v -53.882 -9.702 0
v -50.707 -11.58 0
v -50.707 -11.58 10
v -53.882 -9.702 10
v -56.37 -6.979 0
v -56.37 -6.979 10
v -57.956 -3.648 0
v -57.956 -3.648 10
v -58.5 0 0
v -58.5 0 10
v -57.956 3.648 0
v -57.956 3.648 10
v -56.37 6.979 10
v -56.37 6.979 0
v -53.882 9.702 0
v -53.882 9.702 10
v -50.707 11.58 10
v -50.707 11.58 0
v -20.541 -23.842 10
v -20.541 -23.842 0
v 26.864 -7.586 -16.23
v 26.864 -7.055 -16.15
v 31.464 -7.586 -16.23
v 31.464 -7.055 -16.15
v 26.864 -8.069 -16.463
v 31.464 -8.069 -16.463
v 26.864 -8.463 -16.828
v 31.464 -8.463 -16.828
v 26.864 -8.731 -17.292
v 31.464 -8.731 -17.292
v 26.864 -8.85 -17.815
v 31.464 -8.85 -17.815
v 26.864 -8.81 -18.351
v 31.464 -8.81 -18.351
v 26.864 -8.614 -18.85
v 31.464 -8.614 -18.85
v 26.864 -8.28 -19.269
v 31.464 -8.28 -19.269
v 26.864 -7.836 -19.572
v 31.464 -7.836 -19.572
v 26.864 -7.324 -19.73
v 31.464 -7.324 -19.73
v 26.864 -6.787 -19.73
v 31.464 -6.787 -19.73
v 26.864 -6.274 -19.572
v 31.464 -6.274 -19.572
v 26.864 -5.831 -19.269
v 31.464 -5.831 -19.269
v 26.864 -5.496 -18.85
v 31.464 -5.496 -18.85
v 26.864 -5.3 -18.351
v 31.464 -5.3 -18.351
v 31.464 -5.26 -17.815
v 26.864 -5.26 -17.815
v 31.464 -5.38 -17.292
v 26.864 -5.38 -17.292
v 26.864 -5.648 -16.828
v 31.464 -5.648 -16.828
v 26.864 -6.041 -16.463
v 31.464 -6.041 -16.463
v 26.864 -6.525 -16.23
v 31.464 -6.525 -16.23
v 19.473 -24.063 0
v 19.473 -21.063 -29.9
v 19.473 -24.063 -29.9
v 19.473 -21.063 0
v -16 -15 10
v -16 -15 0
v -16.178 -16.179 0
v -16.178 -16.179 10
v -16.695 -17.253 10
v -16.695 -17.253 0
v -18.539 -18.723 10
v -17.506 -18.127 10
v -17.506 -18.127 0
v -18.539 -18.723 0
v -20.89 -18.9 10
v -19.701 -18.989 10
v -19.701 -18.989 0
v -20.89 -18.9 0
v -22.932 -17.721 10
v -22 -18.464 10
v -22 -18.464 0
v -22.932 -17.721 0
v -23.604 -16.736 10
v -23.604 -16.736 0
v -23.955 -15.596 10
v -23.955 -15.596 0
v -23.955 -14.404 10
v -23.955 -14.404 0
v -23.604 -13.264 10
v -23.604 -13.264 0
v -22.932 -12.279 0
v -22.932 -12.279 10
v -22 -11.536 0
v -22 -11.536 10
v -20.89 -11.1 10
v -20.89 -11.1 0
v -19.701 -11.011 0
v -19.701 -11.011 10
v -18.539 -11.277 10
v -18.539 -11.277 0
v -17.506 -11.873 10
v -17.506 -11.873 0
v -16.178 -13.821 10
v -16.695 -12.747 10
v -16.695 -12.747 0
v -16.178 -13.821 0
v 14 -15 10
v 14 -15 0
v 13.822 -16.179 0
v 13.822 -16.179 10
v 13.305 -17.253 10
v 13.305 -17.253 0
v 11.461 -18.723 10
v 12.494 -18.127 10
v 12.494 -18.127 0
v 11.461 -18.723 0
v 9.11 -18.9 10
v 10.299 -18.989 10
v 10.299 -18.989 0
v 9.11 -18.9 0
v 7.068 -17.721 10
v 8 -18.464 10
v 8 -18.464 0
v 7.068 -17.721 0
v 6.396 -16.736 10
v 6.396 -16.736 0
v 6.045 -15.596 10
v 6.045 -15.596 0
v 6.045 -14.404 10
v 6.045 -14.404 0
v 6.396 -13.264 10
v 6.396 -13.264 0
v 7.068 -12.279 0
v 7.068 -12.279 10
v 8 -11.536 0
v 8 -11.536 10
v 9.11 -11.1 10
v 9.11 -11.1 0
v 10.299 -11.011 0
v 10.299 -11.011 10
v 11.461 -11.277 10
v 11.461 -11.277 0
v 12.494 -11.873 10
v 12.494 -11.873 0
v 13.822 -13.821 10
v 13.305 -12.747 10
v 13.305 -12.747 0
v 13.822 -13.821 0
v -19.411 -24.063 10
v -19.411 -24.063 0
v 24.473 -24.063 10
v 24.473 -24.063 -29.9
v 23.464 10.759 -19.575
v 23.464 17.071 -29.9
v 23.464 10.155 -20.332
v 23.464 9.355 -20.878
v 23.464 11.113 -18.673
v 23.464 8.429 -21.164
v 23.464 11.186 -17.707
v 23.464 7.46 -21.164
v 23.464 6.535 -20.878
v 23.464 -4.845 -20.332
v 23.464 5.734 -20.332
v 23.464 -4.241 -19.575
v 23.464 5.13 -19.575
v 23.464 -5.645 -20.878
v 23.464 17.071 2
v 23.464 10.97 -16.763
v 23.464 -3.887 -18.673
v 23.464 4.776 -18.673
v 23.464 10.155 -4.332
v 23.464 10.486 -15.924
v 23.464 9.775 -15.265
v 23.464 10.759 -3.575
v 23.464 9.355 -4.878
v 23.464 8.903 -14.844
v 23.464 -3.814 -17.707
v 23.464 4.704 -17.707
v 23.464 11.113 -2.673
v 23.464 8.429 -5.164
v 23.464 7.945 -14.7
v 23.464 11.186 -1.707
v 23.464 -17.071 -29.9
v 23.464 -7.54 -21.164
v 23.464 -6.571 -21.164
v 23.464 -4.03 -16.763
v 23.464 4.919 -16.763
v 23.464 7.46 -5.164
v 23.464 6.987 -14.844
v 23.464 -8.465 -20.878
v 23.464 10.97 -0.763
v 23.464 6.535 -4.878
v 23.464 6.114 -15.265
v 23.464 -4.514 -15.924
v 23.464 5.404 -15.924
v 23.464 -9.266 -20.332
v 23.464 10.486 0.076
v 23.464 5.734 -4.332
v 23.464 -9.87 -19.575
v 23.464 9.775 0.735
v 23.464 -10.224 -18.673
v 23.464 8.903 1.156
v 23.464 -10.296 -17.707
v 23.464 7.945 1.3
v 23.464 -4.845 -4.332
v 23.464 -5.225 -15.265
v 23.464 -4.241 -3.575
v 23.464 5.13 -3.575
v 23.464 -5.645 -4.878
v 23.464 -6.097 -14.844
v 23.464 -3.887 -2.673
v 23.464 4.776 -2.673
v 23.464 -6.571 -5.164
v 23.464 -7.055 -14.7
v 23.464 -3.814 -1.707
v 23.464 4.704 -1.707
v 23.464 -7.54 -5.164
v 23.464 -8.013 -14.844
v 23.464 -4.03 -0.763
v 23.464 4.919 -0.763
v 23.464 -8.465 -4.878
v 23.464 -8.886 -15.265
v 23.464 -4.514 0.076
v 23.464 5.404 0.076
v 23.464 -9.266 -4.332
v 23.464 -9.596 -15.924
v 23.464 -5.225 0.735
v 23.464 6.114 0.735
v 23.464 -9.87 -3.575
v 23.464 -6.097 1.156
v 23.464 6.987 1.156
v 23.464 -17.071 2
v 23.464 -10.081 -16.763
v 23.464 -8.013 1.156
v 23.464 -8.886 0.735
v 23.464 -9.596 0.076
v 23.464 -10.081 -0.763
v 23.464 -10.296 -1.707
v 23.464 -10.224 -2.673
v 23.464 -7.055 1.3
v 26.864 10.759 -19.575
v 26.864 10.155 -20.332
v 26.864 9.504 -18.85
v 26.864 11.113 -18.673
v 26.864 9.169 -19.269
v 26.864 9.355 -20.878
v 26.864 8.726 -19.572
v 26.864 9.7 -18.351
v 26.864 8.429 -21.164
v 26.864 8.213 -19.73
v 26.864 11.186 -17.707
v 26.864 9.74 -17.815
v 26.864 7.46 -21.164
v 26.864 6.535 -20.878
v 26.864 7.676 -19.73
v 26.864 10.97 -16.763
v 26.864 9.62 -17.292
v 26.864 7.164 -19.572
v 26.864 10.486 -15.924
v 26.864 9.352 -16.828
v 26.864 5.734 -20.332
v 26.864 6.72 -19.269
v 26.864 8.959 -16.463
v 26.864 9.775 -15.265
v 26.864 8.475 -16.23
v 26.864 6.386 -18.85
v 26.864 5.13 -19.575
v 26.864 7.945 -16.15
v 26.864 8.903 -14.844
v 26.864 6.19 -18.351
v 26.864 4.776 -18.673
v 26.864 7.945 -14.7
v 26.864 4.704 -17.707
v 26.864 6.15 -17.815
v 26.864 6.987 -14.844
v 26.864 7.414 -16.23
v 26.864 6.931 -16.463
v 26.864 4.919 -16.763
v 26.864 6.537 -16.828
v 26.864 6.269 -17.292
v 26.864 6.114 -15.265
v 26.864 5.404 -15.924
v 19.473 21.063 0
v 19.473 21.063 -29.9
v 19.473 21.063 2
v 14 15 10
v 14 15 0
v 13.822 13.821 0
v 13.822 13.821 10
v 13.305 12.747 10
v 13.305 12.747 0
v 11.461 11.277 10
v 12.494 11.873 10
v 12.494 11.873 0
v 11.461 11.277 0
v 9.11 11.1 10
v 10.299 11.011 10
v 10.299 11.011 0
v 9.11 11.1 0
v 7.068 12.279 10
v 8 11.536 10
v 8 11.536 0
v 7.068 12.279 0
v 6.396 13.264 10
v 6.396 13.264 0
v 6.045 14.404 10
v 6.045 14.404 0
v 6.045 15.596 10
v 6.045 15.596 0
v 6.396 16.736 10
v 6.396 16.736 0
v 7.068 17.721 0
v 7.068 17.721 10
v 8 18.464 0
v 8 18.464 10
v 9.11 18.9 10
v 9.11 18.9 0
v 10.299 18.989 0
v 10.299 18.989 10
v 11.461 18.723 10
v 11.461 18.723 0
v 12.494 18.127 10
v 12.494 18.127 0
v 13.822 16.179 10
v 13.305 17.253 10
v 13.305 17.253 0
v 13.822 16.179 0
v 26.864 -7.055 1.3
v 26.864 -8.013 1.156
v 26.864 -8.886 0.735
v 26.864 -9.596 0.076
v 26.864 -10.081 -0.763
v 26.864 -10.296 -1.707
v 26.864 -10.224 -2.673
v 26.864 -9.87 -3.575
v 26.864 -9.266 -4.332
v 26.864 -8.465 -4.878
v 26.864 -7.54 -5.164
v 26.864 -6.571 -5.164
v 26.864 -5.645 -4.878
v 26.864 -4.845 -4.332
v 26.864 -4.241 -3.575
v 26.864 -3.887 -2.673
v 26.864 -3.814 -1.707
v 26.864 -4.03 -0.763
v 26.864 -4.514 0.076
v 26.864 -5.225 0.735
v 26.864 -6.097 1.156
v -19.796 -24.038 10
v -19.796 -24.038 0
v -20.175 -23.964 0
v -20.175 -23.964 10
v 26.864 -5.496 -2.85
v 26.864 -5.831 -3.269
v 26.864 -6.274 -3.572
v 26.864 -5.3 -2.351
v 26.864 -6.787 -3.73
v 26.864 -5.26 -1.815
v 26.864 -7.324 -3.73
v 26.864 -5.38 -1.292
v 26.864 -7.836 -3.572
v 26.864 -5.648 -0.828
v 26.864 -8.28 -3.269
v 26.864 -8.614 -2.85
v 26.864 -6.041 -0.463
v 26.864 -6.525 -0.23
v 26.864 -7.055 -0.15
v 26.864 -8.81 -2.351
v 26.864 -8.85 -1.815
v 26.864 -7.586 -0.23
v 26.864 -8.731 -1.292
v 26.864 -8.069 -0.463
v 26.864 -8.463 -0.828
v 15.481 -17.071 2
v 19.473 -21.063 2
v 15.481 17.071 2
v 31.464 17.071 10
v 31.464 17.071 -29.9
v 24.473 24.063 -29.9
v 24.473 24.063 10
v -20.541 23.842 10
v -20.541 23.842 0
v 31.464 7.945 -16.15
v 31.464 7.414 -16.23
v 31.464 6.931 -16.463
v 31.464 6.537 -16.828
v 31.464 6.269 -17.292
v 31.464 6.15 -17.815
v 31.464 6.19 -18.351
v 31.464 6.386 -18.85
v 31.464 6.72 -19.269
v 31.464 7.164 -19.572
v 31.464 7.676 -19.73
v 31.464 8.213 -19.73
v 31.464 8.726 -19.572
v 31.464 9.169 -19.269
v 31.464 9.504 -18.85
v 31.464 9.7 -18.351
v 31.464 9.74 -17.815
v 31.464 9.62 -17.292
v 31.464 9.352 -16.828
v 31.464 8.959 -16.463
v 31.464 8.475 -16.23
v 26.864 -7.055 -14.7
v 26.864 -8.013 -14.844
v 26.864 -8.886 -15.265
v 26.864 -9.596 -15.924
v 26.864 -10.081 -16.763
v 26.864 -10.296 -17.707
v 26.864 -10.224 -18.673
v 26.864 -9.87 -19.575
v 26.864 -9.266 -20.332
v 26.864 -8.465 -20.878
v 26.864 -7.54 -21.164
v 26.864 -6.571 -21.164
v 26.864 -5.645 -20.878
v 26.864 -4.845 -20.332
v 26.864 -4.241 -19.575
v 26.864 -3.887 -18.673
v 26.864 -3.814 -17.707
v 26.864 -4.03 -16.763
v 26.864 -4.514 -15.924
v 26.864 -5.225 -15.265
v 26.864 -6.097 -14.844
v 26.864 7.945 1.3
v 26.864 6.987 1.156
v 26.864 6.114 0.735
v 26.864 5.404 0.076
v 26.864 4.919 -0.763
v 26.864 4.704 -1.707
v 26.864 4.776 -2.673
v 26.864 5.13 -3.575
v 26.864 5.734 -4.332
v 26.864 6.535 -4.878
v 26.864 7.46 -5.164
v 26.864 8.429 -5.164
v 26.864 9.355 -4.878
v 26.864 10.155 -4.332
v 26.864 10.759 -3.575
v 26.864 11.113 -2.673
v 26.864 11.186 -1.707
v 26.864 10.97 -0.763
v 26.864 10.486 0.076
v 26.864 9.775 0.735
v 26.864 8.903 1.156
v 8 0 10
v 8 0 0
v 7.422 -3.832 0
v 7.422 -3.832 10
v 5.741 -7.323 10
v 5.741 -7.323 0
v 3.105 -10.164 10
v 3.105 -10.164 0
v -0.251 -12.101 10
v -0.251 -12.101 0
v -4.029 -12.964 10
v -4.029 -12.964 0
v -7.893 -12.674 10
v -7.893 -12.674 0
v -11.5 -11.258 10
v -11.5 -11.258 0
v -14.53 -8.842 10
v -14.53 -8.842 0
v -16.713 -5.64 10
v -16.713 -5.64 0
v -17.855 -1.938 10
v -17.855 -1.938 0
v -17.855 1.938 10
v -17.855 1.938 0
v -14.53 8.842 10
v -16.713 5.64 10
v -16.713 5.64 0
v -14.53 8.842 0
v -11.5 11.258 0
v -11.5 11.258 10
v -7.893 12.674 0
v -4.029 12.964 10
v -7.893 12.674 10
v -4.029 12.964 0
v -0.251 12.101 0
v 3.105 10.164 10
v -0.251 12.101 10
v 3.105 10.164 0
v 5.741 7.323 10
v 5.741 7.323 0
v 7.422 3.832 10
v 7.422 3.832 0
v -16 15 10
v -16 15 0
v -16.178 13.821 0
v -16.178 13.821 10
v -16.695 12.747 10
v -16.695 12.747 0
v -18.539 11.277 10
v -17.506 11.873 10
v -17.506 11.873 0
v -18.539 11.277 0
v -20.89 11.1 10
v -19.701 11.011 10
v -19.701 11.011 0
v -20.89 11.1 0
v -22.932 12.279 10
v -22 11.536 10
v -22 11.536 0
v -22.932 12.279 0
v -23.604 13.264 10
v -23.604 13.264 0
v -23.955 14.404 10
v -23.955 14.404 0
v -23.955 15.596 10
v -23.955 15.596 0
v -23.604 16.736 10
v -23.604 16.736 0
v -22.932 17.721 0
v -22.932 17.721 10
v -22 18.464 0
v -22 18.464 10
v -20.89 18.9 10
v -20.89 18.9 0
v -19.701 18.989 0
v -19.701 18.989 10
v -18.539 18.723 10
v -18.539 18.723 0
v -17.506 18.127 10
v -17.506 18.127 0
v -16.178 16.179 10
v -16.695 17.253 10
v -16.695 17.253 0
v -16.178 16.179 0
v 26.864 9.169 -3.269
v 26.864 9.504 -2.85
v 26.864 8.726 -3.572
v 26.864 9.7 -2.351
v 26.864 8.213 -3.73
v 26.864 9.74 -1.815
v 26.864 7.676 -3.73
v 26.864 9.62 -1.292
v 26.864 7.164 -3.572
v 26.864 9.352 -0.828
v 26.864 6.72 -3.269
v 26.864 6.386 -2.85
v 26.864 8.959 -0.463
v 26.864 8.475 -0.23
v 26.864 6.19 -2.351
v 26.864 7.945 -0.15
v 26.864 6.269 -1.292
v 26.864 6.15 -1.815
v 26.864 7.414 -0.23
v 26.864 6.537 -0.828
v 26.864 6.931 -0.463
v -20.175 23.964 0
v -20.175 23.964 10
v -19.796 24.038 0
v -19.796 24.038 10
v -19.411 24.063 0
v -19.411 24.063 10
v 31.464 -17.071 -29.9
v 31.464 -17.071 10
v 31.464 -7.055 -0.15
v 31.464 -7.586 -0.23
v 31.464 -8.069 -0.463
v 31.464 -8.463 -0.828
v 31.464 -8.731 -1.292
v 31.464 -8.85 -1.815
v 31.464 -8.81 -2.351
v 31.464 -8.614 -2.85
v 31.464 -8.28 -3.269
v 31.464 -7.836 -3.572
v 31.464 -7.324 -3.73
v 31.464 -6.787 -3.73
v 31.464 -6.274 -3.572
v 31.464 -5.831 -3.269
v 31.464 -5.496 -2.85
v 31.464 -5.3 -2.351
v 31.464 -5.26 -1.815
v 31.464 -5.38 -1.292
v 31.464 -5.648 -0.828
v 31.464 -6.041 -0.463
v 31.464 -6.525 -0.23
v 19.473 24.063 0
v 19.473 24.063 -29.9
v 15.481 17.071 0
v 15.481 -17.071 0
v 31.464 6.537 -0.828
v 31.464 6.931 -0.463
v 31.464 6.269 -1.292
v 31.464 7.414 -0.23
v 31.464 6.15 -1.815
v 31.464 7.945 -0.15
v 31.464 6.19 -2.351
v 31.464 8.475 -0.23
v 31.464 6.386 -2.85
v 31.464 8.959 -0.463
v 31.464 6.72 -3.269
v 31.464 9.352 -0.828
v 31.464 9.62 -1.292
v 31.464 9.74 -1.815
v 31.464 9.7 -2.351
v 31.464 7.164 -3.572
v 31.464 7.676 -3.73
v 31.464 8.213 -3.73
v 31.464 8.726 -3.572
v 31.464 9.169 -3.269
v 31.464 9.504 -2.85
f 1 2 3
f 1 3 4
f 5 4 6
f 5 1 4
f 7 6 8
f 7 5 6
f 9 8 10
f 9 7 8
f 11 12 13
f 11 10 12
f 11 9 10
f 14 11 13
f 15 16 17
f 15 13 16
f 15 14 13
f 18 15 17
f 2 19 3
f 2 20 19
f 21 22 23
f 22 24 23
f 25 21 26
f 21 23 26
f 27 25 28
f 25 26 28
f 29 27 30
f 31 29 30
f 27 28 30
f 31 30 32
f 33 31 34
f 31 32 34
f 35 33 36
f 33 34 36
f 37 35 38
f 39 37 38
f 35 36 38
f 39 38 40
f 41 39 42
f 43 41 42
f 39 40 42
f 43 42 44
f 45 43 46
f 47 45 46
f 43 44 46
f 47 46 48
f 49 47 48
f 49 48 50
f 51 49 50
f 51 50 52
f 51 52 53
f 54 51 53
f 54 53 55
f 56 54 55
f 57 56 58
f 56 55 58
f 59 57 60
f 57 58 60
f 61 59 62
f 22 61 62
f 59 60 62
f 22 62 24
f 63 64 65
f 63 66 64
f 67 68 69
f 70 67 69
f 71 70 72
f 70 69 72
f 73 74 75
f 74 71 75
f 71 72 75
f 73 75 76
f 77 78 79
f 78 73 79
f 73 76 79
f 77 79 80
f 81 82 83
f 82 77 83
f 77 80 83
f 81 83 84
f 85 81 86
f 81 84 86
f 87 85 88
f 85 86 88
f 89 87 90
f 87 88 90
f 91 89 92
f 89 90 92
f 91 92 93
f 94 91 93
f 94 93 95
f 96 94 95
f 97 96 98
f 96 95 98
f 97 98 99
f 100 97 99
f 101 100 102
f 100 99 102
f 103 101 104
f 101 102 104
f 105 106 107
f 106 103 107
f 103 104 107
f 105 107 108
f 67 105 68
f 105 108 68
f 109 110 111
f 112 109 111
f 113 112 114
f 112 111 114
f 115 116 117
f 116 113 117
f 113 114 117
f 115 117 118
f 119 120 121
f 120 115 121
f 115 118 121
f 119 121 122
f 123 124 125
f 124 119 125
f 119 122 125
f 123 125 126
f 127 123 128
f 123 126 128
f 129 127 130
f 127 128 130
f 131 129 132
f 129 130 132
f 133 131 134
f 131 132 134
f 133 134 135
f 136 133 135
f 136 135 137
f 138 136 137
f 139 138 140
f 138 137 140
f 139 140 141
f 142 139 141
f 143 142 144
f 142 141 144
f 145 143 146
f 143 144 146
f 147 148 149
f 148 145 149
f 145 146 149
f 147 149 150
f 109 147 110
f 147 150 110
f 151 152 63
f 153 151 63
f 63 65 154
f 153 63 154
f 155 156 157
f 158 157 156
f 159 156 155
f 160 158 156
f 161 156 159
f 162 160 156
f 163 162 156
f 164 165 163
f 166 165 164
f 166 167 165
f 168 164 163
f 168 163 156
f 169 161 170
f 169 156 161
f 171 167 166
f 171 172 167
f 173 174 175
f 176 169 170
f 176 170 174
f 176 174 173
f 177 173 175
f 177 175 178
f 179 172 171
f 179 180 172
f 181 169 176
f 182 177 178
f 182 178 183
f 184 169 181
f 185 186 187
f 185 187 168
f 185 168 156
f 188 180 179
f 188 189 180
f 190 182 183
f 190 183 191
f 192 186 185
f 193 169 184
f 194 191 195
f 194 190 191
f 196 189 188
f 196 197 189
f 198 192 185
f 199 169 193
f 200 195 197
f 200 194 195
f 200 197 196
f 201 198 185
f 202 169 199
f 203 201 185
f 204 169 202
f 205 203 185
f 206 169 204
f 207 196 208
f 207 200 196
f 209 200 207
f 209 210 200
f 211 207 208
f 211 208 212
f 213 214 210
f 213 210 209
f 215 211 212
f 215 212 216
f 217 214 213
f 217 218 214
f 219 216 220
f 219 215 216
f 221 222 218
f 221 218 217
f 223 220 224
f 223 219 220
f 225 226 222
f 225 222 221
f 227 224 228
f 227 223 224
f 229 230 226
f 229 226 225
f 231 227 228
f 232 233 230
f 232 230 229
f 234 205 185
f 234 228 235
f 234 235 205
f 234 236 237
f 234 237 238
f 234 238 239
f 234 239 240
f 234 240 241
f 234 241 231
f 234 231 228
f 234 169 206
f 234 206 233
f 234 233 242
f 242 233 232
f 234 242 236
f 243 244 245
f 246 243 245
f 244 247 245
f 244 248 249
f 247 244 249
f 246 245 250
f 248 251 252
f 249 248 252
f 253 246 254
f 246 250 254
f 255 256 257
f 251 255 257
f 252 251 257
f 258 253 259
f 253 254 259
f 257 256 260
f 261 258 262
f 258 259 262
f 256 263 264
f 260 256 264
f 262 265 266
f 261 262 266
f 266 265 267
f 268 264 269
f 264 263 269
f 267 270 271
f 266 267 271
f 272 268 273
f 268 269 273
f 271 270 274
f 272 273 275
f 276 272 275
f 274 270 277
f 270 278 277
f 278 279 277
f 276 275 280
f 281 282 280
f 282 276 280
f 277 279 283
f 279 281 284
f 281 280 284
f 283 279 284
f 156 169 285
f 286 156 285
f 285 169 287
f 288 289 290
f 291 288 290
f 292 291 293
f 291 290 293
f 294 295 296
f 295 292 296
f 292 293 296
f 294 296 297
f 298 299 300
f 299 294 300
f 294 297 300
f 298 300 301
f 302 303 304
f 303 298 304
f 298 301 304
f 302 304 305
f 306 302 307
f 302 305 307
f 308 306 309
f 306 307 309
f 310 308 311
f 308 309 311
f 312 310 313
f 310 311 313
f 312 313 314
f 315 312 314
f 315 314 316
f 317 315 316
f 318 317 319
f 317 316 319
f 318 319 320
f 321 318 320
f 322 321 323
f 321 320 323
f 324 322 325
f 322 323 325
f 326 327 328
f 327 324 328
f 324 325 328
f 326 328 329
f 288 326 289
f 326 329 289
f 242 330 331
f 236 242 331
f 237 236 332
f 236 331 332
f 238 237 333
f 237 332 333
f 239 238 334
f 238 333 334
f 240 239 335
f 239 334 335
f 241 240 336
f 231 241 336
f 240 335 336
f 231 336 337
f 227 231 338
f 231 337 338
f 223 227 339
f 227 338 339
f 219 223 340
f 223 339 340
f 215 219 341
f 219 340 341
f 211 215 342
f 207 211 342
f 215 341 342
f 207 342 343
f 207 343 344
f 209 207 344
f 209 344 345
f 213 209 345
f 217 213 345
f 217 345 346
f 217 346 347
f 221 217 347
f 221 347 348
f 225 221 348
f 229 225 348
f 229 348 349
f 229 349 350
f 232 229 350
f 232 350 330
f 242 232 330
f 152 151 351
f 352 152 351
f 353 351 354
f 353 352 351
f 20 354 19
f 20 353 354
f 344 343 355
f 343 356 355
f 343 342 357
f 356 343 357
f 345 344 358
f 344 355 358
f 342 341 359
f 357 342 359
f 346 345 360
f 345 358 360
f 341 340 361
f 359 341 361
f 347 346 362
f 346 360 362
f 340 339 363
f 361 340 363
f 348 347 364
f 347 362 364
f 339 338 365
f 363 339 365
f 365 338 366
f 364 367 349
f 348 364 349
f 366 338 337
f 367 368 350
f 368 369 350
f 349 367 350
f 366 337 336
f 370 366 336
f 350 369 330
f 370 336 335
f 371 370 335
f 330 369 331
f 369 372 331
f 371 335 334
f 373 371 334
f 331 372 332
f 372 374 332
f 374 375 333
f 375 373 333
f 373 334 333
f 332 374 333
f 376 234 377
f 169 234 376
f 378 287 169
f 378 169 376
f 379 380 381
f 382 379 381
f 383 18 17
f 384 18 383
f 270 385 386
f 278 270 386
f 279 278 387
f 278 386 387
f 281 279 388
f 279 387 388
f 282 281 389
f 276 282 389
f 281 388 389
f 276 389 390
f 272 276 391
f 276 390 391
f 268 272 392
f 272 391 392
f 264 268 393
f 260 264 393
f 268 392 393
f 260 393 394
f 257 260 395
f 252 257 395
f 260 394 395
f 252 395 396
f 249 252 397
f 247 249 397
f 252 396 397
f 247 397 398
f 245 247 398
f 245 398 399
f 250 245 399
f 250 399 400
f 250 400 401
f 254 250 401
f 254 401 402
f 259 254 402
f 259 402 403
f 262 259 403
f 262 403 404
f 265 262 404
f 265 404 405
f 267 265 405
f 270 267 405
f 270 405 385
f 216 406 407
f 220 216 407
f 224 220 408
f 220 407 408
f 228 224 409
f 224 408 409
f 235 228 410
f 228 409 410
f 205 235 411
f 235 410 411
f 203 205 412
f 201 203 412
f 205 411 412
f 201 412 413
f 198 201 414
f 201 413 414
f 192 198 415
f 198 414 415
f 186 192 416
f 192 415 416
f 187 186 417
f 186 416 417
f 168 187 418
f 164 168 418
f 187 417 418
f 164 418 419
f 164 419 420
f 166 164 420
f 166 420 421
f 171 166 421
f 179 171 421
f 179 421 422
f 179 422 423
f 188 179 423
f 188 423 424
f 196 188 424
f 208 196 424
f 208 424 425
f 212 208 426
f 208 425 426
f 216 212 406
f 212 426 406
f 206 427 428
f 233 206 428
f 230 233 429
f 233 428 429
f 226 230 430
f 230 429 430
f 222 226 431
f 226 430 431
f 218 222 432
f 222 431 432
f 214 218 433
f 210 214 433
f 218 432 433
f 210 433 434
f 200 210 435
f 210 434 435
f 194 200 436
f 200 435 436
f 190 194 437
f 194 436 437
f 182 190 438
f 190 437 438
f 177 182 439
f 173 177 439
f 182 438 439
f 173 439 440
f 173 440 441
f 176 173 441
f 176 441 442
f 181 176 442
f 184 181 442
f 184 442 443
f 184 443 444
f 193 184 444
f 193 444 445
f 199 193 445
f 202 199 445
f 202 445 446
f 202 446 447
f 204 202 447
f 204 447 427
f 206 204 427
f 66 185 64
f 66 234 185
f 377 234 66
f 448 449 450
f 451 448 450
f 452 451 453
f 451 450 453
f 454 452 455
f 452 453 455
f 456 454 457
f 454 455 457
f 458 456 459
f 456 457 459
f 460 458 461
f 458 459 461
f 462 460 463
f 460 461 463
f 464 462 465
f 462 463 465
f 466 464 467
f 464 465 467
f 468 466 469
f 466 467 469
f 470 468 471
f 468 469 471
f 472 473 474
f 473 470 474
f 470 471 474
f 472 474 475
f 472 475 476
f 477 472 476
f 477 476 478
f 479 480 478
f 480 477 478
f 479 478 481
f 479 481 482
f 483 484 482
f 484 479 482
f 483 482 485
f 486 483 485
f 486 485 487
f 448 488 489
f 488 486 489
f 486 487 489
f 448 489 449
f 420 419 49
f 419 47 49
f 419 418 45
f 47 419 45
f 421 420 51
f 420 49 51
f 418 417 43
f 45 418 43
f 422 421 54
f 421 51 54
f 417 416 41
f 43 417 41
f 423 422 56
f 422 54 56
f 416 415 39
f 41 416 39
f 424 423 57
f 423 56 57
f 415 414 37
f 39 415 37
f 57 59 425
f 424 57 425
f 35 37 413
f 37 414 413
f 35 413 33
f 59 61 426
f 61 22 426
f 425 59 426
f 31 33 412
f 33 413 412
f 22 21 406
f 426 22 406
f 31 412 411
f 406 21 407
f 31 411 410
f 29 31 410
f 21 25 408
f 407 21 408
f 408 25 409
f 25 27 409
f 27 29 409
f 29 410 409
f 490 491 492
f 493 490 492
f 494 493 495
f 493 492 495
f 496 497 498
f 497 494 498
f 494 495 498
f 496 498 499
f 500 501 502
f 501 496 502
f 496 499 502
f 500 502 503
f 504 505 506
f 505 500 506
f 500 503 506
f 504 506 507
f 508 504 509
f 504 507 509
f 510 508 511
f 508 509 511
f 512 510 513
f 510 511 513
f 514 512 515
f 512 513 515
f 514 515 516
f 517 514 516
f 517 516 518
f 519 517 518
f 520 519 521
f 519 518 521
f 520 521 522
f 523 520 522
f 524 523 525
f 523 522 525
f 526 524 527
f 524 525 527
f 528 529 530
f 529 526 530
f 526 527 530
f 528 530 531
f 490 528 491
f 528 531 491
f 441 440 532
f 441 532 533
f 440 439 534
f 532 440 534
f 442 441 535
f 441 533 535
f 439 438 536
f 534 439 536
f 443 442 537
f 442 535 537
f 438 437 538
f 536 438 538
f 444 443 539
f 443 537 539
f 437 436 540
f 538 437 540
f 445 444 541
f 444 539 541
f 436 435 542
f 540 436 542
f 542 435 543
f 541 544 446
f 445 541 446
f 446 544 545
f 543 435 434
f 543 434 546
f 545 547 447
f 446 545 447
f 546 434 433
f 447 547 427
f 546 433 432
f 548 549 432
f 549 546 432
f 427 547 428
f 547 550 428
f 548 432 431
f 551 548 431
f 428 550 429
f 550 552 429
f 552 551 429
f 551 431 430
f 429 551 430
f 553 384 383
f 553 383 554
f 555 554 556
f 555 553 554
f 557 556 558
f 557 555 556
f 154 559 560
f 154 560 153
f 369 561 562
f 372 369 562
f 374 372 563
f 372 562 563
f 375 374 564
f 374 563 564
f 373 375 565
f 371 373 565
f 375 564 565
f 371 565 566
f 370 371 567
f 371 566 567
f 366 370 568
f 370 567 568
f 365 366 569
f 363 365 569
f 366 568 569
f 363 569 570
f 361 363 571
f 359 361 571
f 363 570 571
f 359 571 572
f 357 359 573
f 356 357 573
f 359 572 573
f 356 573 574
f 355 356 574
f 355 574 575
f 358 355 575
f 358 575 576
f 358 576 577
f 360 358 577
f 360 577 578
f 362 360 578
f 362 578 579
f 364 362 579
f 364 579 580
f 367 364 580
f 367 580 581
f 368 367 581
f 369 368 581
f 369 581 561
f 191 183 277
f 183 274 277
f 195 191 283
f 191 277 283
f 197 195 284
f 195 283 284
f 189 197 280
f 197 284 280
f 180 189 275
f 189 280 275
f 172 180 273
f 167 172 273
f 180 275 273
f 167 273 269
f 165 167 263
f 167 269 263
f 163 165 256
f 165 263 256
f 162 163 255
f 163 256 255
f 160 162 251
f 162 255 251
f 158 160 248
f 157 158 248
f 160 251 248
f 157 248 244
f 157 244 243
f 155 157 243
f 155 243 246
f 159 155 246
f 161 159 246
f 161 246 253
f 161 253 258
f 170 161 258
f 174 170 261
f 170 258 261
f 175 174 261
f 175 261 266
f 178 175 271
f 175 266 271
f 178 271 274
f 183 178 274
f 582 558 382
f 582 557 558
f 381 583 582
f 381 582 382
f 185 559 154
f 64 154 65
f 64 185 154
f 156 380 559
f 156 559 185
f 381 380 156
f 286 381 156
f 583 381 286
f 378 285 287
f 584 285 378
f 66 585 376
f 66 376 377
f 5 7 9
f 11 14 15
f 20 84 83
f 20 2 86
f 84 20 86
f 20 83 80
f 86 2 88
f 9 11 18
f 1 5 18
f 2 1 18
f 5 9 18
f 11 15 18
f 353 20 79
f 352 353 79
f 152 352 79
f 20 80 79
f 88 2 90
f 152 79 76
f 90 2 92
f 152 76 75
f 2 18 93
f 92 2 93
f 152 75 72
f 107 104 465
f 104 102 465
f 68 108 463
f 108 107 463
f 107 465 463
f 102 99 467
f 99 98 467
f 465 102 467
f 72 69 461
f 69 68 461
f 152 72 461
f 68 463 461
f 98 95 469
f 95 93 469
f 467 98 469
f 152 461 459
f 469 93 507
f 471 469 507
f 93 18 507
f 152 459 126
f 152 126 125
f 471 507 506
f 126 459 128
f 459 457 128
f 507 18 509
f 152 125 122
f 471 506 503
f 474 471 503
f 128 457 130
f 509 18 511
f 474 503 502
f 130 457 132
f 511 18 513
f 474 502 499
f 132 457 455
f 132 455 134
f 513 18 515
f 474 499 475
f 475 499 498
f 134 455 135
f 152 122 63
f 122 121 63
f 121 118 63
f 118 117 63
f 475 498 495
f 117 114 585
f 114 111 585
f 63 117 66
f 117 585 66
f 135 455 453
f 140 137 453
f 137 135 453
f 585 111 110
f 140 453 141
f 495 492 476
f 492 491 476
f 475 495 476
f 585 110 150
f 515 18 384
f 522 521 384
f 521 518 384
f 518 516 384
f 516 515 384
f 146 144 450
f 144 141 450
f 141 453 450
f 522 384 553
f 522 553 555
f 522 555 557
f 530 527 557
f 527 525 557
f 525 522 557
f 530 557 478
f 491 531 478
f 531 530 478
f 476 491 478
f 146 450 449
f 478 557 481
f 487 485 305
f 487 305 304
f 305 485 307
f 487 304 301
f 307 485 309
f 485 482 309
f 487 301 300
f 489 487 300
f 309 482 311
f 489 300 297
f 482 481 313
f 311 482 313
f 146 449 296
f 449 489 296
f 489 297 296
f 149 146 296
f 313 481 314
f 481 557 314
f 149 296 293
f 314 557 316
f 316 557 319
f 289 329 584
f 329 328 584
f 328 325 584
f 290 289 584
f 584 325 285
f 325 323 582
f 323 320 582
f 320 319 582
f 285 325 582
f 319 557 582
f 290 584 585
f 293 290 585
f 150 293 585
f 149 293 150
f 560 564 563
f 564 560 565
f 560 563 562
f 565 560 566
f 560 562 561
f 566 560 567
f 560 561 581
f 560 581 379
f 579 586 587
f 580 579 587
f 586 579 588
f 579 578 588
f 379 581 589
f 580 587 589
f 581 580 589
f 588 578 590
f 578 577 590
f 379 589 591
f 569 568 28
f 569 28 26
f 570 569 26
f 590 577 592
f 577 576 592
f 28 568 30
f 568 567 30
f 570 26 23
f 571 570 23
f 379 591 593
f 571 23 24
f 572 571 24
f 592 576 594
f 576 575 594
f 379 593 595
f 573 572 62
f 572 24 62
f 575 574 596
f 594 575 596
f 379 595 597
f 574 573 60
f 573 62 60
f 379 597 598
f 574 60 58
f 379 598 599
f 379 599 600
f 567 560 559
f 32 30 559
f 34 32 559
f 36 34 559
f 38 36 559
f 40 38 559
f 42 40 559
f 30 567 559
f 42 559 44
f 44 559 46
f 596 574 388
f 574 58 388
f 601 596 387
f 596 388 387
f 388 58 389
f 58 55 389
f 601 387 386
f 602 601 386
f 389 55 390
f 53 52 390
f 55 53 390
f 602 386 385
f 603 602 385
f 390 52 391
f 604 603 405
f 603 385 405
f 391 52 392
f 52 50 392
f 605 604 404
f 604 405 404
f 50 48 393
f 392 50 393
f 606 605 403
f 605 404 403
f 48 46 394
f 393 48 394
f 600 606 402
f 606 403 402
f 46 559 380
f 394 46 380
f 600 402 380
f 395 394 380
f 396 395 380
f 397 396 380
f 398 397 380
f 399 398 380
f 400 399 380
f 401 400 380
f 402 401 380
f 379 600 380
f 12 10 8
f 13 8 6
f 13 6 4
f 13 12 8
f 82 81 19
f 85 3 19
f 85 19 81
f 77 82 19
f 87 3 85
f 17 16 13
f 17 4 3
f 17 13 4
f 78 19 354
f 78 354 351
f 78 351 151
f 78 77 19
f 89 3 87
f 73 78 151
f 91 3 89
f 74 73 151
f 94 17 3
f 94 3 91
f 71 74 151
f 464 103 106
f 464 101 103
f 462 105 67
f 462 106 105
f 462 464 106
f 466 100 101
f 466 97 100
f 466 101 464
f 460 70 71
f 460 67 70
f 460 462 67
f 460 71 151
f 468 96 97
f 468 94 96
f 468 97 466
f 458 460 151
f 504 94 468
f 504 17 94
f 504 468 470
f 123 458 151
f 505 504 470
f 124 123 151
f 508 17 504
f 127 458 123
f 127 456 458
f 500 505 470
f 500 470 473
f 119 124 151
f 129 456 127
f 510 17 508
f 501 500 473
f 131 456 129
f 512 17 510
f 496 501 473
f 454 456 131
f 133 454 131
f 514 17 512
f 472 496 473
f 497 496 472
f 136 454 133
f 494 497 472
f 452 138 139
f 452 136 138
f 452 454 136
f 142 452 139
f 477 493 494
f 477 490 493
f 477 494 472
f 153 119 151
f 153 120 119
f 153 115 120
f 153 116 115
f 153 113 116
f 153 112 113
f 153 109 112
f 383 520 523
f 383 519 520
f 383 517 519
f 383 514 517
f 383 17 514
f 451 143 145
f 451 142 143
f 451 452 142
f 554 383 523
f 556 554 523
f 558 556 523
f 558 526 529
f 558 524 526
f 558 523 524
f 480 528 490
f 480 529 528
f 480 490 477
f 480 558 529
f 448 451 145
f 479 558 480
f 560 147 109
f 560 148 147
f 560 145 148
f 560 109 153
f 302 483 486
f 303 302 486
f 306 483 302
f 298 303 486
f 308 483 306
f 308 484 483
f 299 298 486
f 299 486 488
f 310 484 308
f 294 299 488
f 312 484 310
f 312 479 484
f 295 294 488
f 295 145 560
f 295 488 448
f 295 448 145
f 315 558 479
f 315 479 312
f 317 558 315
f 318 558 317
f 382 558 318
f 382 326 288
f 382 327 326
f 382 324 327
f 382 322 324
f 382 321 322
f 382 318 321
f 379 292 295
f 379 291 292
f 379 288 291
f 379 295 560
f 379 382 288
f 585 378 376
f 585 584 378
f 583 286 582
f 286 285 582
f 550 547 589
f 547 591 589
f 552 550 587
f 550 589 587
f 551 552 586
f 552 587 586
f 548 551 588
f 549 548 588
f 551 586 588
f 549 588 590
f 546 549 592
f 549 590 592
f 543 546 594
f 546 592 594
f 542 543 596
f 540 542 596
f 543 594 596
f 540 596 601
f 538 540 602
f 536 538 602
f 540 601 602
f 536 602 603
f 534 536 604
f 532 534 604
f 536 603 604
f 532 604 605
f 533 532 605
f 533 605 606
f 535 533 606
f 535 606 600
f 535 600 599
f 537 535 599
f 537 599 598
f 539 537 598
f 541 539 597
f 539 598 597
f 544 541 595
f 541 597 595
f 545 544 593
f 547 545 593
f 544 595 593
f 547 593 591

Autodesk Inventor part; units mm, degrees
ref_plane "YZ Plane" through (0, 0, 0) normal (1, 0, 0) x (0, 1, 0)
ref_plane "XZ Plane" through (0, 0, 0) normal (0, 1, 0) x (-1, 0, 0)
ref_plane "XY Plane" through (0, 0, 0) normal (0, 0, 1) x (1, 0, 0)
sketch "Sketch1" plane through (0, 0, 0) normal (0, 0, 1) x (1, 0, 0)
  arc A0 (18.1843, -16.5324) -> (18.7618, -13.101) centre (16.0629, -14.4111) ccw projected
  arc A1 (18.7618, 13.101) -> (18.7618, -13.101) centre (45.75, 0) ccw projected
  arc A2 (18.7618, 13.101) -> (18.1843, 16.5324) centre (16.0629, 14.4111) ccw projected
  line L0 (11.5324, 23.1843) -> (18.1843, 16.5324) projected
  arc A3 (11.5324, 23.1843) -> (8.101, 23.7618) centre (9.4111, 21.0629) ccw projected
  arc A4 (-18.101, 23.7618) -> (8.101, 23.7618) centre (-5, 50.75) ccw projected
  arc A5 (-18.101, 23.7618) -> (-21.5324, 23.1843) centre (-19.4111, 21.0629) ccw projected
  line L1 (-28.1843, 16.5324) -> (-21.5324, 23.1843) projected
  arc A6 (-28.1843, 16.5324) -> (-28.7618, 13.101) centre (-26.0629, 14.4111) ccw projected
  arc A7 (-28.7618, -13.101) -> (-28.7618, 13.101) centre (-55.75, 0) ccw projected
  arc A8 (-28.7618, -13.101) -> (-28.1843, -16.5324) centre (-26.0629, -14.4111) ccw projected
  line L2 (-21.5324, -23.1843) -> (-28.1843, -16.5324) projected
  arc A9 (-21.5324, -23.1843) -> (-18.101, -23.7618) centre (-19.4111, -21.0629) ccw projected
  arc A10 (8.101, -23.7618) -> (-18.101, -23.7618) centre (-5, -50.75) ccw projected
  arc A11 (8.101, -23.7618) -> (11.5324, -23.1843) centre (9.4111, -21.0629) ccw projected
  line L3 (18.1843, -16.5324) -> (11.5324, -23.1843) projected
  circle A12 centre (10, -15) radius 4 projected
  circle A13 centre (-20, -15) radius 4 projected
  circle A14 centre (-20, 15) radius 4 projected
  circle A15 centre (10, 15) radius 4 projected
  circle A16 centre (-5, 0) radius 13 projected
  line L4 (39.4645, -4.5) -> (34.9645, -4.5) projected
  line L5 (34.9645, -4.5) -> (34.9645, 4.5) projected
  line L6 (34.9645, 4.5) -> (39.4645, 4.5) projected
  line L7 (39.4645, 4.5) -> (39.4645, 10) projected
  line L8 (39.4645, 10) -> (31.4645, 10) projected
  line L9 (31.4645, 10) -> (31.4645, -10) projected
  line L10 (31.4645, -10) -> (39.4645, -10) projected
  line L11 (39.4645, -10) -> (39.4645, -4.5) projected
  line L12 (31.4645, -10) -> (31.4645, -17.0711)
  line L13 (31.4645, -17.0711) -> (24.4726, -24.0629)
  line L14 (31.4645, 10) -> (31.4645, 17.0711)
  line L15 (-19.4111, -24.0629) -> (24.4726, -24.0629)
  line L16 (-19.4111, 24.0629) -> (24.4726, 24.0629)
  line L17 (31.4645, 17.0711) -> (24.4726, 24.0629)
  circle A17 centre (-46, 0) radius 12.5
  line L18 (-20.5407, -23.8421) -> (-50.7071, -11.5799)
  line L19 (-50.7071, 11.5799) -> (-20.5407, 23.8421)
  point P0 (0, 0)
  dimension "d0" = 45
  dimension "d1" = 5
  dimension "d4" = 46
  dimension "d5" = 25
extrude "Extrusion1" add sketch "Sketch1" along normal blind 10 contours L3 A11 A10 A9 L2 A8 A7 A6 L1 A5 A4 A3 L0 A2 A1 A0 | A0 A1 A2 L0 A3 L16 L17 L14 L9 L12 L13 L15 A11 L3 | L15 A9 A10 A11 | L18 A17 L19 A5 L1 A6 A7 A8 L2 A9 | A3 A4 A5 L16 | A17
sketch "Sketch2" plane through (0, 0, 0) normal (0, 0, -1) x (-1, 0, 0)
  line L0 (-24.4726, -24.0629) -> (-31.4645, -17.0711) projected
  line L1 (19.4111, -24.0629) -> (-24.4726, -24.0629) projected
  arc A0 (19.4111, -24.0629) -> (20.5407, -23.8421) centre (19.4111, -21.0629) ccw projected
  line L2 (50.7071, -11.5799) -> (20.5407, -23.8421) projected
  arc A1 (50.7071, -11.5799) -> (50.7071, 11.5799) centre (46, 0) ccw projected
  line L3 (20.5407, 23.8421) -> (50.7071, 11.5799) projected
  arc A2 (20.5407, 23.8421) -> (19.4111, 24.0629) centre (19.4111, 21.0629) ccw projected
  line L4 (-24.4726, 24.0629) -> (19.4111, 24.0629) projected
  line L5 (-31.4645, 17.0711) -> (-24.4726, 24.0629) projected
  line L6 (-31.4645, -17.0711) -> (-31.4645, 17.0711) projected
  circle A3 centre (-10, -15) radius 4 projected
  circle A4 centre (20, -15) radius 4 projected
  circle A5 centre (20, 15) radius 4 projected
  circle A6 centre (-10, 15) radius 4 projected
  circle A7 centre (5, 0) radius 13 projected
  line L7 (-31.4645, 17.0711) -> (-23.4645, 17.0711)
  line L8 (-23.4645, 17.0711) -> (-23.4645, -17.0711)
  line L9 (-24.4726, -24.0629) -> (-31.4645, -17.0711) projected
  line L10 (-23.4645, -17.0711) -> (-31.4645, -17.0711)
  line L11 (-23.4645, 17.0711) -> (-19.4726, 21.0629)
  line L12 (-19.4726, 21.0629) -> (-19.4726, 24.0629)
  line L13 (-23.4645, -17.0711) -> (-19.4726, -21.0629)
  line L14 (-19.4726, -21.0629) -> (-19.4726, -24.0629)
  line L15 (19.4111, -24.0629) -> (-24.4726, -24.0629) projected
  point P0 (0, 0)
  dimension "d6" = 8
  dimension "d9" = 3
extrude "Extrusion2" add sketch "Sketch2" along normal blind 29.9 contours L0 L10 L13 L14 L1 | L6 L7 L8 L10 | L5 L4 L12 L11 L7
sketch "Sketch3" plane through (23.4645, -17.0711, 0) normal (-1, 0, 0) x (0, 0, 1)
  line L0 (0, 34.1421) -> (0, 0) projected
  line L1 (0, 34.1421) -> (-29.9, 34.1421) projected
  line L2 (-29.9, 0) -> (-29.9, 34.1421) projected
  line L3 (0, 0) -> (-29.9, 0) projected
  point P0 (0, 17.0711)
  point P1 (-1.95, 25.0158)
  point P2 (-17.95, 25.0158)
  point P3 (-17.95, 10.0158)
  point P4 (-1.95, 10.0158)
  dimension "d10" = 15
  dimension "d11" = 16
  dimension "d12" = 11.95
hole "Hole1" at (23.4645, 7.9447, -1.95) at (23.4645, 7.9447, -17.95) at (23.4645, -7.0553, -17.95) at (23.4645, -7.0553, -1.95) direction (1, 0, 0) diameter 3.6 end through all counterbore diameter 6.5 counterbore depth 3.4 clearance for "Socket Head Cap Screw DIN EN ISO 4762" size "M3" standard "DIN"
sketch "Sketch4" plane through (0, 0, 0) normal (0, 0, -1) x (-1, 0, 0)
  circle A0 centre (5, 0) radius 13 projected
  circle A1 centre (-10, 15) radius 4 projected
  circle A2 centre (20, 15) radius 4 projected
  circle A3 centre (20, -15) radius 4 projected
  circle A4 centre (-10, -15) radius 4 projected
  line L0 (-19.4726, 24.0629) -> (-19.4726, 21.0629) projected
  line L1 (-19.4726, 21.0629) -> (-23.4645, 17.0711) projected
  line L2 (-23.4645, 17.0711) -> (-23.4645, 10.5447) projected
  line L3 (-23.4645, 10.5447) -> (-23.4645, 5.3447) projected
  line L4 (-23.4645, 5.3447) -> (-23.4645, -4.4553) projected
  line L5 (-23.4645, -4.4553) -> (-23.4645, -9.6553) projected
  line L6 (-23.4645, -9.6553) -> (-23.4645, -17.0711) projected
  line L7 (-23.4645, -17.0711) -> (-19.4726, -21.0629) projected
  line L8 (-19.4726, -21.0629) -> (-19.4726, -24.0629) projected
  line L9 (19.4111, -24.0629) -> (-19.4726, -24.0629) projected
  arc A5 (19.4111, -24.0629) -> (20.5407, -23.8421) centre (19.4111, -21.0629) ccw projected
  line L10 (50.7071, -11.5799) -> (20.5407, -23.8421) projected
  arc A6 (50.7071, -11.5799) -> (50.7071, 11.5799) centre (46, 0) ccw projected
  line L11 (20.5407, 23.8421) -> (50.7071, 11.5799) projected
  arc A7 (20.5407, 23.8421) -> (19.4111, 24.0629) centre (19.4111, 21.0629) ccw projected
  line L12 (-19.4726, 24.0629) -> (19.4111, 24.0629) projected
  line L13 (-19.4726, 21.0629) -> (-15.4807, 17.0711)
  line L14 (-15.4807, 17.0711) -> (-15.4807, -17.0711)
  line L15 (-15.4807, -17.0711) -> (-19.4726, -21.0629)
  line L16 (-23.4645, 17.0711) -> (-19.4726, 21.0629) projected
  point P0 (0, 0)
extrude "Extrusion3" cut sketch "Sketch4" against normal blind 2 contours L13 L14 L15 L7 L6 L5 L4 L3 L2 L1
properties part number "Rear Z Axis Carriage" material "ABS Plastic"
